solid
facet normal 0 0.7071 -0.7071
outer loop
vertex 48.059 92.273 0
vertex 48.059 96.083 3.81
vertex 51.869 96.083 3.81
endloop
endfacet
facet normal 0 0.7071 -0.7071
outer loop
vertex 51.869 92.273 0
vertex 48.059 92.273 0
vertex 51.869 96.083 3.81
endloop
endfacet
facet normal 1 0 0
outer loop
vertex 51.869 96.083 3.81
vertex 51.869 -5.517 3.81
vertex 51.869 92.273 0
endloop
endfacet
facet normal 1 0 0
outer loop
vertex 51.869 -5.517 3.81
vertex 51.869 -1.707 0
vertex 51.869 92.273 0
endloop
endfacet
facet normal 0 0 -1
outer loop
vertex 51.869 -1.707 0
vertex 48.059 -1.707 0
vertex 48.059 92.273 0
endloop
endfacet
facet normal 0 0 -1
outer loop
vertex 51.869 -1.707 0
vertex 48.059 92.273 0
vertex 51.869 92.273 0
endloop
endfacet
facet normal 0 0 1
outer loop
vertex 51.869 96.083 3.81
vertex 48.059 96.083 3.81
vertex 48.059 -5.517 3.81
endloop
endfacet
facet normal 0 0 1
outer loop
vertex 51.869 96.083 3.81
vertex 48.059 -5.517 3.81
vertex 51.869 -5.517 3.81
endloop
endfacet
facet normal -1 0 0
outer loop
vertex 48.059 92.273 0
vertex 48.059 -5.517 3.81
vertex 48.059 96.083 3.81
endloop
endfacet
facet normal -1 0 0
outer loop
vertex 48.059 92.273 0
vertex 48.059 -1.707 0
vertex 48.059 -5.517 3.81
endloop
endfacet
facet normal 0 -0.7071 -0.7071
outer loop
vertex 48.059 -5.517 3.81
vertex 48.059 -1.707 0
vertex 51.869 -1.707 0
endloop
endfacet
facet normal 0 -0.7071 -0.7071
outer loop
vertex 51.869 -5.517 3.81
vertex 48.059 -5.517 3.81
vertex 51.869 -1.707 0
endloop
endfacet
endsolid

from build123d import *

# Parameters (mm, degrees)
F0_W     = 3.81
F0_H     = 101.6
F1_DEPTH = 3.81
F2_SIZE  = 3.80999
F3_SIZE  = 3.80999


# Not quite as in the source:
# - a fillet or chamfer is up to 0.001 mm smaller than in the source, because OpenCascade refuses the exact size


with BuildPart() as f1:
    # F0 (on Top) → F1 (new body)
    with BuildSketch(Plane.XY):
        with Locations((49.9639250338, 45.283157554)):
            Rectangle(F0_W, F0_H)
    extrude(amount=F1_DEPTH)

    # F2 (size 3.81 in the source; OpenCascade refuses exactly that, so slightly less here)
    f2_edges = [f1.edges().sort_by_distance(p)[0] for p in [
        (49.963925, -5.516842, 0),
    ]]
    chamfer(f2_edges, length=F2_SIZE)

    # F3 (size 3.81 in the source; OpenCascade refuses exactly that, so slightly less here)
    f3_edges = [f1.edges().sort_by_distance(p)[0] for p in [
        (49.963925, 96.083158, 0),
    ]]
    chamfer(f3_edges, length=F3_SIZE)


solid = f1.part
